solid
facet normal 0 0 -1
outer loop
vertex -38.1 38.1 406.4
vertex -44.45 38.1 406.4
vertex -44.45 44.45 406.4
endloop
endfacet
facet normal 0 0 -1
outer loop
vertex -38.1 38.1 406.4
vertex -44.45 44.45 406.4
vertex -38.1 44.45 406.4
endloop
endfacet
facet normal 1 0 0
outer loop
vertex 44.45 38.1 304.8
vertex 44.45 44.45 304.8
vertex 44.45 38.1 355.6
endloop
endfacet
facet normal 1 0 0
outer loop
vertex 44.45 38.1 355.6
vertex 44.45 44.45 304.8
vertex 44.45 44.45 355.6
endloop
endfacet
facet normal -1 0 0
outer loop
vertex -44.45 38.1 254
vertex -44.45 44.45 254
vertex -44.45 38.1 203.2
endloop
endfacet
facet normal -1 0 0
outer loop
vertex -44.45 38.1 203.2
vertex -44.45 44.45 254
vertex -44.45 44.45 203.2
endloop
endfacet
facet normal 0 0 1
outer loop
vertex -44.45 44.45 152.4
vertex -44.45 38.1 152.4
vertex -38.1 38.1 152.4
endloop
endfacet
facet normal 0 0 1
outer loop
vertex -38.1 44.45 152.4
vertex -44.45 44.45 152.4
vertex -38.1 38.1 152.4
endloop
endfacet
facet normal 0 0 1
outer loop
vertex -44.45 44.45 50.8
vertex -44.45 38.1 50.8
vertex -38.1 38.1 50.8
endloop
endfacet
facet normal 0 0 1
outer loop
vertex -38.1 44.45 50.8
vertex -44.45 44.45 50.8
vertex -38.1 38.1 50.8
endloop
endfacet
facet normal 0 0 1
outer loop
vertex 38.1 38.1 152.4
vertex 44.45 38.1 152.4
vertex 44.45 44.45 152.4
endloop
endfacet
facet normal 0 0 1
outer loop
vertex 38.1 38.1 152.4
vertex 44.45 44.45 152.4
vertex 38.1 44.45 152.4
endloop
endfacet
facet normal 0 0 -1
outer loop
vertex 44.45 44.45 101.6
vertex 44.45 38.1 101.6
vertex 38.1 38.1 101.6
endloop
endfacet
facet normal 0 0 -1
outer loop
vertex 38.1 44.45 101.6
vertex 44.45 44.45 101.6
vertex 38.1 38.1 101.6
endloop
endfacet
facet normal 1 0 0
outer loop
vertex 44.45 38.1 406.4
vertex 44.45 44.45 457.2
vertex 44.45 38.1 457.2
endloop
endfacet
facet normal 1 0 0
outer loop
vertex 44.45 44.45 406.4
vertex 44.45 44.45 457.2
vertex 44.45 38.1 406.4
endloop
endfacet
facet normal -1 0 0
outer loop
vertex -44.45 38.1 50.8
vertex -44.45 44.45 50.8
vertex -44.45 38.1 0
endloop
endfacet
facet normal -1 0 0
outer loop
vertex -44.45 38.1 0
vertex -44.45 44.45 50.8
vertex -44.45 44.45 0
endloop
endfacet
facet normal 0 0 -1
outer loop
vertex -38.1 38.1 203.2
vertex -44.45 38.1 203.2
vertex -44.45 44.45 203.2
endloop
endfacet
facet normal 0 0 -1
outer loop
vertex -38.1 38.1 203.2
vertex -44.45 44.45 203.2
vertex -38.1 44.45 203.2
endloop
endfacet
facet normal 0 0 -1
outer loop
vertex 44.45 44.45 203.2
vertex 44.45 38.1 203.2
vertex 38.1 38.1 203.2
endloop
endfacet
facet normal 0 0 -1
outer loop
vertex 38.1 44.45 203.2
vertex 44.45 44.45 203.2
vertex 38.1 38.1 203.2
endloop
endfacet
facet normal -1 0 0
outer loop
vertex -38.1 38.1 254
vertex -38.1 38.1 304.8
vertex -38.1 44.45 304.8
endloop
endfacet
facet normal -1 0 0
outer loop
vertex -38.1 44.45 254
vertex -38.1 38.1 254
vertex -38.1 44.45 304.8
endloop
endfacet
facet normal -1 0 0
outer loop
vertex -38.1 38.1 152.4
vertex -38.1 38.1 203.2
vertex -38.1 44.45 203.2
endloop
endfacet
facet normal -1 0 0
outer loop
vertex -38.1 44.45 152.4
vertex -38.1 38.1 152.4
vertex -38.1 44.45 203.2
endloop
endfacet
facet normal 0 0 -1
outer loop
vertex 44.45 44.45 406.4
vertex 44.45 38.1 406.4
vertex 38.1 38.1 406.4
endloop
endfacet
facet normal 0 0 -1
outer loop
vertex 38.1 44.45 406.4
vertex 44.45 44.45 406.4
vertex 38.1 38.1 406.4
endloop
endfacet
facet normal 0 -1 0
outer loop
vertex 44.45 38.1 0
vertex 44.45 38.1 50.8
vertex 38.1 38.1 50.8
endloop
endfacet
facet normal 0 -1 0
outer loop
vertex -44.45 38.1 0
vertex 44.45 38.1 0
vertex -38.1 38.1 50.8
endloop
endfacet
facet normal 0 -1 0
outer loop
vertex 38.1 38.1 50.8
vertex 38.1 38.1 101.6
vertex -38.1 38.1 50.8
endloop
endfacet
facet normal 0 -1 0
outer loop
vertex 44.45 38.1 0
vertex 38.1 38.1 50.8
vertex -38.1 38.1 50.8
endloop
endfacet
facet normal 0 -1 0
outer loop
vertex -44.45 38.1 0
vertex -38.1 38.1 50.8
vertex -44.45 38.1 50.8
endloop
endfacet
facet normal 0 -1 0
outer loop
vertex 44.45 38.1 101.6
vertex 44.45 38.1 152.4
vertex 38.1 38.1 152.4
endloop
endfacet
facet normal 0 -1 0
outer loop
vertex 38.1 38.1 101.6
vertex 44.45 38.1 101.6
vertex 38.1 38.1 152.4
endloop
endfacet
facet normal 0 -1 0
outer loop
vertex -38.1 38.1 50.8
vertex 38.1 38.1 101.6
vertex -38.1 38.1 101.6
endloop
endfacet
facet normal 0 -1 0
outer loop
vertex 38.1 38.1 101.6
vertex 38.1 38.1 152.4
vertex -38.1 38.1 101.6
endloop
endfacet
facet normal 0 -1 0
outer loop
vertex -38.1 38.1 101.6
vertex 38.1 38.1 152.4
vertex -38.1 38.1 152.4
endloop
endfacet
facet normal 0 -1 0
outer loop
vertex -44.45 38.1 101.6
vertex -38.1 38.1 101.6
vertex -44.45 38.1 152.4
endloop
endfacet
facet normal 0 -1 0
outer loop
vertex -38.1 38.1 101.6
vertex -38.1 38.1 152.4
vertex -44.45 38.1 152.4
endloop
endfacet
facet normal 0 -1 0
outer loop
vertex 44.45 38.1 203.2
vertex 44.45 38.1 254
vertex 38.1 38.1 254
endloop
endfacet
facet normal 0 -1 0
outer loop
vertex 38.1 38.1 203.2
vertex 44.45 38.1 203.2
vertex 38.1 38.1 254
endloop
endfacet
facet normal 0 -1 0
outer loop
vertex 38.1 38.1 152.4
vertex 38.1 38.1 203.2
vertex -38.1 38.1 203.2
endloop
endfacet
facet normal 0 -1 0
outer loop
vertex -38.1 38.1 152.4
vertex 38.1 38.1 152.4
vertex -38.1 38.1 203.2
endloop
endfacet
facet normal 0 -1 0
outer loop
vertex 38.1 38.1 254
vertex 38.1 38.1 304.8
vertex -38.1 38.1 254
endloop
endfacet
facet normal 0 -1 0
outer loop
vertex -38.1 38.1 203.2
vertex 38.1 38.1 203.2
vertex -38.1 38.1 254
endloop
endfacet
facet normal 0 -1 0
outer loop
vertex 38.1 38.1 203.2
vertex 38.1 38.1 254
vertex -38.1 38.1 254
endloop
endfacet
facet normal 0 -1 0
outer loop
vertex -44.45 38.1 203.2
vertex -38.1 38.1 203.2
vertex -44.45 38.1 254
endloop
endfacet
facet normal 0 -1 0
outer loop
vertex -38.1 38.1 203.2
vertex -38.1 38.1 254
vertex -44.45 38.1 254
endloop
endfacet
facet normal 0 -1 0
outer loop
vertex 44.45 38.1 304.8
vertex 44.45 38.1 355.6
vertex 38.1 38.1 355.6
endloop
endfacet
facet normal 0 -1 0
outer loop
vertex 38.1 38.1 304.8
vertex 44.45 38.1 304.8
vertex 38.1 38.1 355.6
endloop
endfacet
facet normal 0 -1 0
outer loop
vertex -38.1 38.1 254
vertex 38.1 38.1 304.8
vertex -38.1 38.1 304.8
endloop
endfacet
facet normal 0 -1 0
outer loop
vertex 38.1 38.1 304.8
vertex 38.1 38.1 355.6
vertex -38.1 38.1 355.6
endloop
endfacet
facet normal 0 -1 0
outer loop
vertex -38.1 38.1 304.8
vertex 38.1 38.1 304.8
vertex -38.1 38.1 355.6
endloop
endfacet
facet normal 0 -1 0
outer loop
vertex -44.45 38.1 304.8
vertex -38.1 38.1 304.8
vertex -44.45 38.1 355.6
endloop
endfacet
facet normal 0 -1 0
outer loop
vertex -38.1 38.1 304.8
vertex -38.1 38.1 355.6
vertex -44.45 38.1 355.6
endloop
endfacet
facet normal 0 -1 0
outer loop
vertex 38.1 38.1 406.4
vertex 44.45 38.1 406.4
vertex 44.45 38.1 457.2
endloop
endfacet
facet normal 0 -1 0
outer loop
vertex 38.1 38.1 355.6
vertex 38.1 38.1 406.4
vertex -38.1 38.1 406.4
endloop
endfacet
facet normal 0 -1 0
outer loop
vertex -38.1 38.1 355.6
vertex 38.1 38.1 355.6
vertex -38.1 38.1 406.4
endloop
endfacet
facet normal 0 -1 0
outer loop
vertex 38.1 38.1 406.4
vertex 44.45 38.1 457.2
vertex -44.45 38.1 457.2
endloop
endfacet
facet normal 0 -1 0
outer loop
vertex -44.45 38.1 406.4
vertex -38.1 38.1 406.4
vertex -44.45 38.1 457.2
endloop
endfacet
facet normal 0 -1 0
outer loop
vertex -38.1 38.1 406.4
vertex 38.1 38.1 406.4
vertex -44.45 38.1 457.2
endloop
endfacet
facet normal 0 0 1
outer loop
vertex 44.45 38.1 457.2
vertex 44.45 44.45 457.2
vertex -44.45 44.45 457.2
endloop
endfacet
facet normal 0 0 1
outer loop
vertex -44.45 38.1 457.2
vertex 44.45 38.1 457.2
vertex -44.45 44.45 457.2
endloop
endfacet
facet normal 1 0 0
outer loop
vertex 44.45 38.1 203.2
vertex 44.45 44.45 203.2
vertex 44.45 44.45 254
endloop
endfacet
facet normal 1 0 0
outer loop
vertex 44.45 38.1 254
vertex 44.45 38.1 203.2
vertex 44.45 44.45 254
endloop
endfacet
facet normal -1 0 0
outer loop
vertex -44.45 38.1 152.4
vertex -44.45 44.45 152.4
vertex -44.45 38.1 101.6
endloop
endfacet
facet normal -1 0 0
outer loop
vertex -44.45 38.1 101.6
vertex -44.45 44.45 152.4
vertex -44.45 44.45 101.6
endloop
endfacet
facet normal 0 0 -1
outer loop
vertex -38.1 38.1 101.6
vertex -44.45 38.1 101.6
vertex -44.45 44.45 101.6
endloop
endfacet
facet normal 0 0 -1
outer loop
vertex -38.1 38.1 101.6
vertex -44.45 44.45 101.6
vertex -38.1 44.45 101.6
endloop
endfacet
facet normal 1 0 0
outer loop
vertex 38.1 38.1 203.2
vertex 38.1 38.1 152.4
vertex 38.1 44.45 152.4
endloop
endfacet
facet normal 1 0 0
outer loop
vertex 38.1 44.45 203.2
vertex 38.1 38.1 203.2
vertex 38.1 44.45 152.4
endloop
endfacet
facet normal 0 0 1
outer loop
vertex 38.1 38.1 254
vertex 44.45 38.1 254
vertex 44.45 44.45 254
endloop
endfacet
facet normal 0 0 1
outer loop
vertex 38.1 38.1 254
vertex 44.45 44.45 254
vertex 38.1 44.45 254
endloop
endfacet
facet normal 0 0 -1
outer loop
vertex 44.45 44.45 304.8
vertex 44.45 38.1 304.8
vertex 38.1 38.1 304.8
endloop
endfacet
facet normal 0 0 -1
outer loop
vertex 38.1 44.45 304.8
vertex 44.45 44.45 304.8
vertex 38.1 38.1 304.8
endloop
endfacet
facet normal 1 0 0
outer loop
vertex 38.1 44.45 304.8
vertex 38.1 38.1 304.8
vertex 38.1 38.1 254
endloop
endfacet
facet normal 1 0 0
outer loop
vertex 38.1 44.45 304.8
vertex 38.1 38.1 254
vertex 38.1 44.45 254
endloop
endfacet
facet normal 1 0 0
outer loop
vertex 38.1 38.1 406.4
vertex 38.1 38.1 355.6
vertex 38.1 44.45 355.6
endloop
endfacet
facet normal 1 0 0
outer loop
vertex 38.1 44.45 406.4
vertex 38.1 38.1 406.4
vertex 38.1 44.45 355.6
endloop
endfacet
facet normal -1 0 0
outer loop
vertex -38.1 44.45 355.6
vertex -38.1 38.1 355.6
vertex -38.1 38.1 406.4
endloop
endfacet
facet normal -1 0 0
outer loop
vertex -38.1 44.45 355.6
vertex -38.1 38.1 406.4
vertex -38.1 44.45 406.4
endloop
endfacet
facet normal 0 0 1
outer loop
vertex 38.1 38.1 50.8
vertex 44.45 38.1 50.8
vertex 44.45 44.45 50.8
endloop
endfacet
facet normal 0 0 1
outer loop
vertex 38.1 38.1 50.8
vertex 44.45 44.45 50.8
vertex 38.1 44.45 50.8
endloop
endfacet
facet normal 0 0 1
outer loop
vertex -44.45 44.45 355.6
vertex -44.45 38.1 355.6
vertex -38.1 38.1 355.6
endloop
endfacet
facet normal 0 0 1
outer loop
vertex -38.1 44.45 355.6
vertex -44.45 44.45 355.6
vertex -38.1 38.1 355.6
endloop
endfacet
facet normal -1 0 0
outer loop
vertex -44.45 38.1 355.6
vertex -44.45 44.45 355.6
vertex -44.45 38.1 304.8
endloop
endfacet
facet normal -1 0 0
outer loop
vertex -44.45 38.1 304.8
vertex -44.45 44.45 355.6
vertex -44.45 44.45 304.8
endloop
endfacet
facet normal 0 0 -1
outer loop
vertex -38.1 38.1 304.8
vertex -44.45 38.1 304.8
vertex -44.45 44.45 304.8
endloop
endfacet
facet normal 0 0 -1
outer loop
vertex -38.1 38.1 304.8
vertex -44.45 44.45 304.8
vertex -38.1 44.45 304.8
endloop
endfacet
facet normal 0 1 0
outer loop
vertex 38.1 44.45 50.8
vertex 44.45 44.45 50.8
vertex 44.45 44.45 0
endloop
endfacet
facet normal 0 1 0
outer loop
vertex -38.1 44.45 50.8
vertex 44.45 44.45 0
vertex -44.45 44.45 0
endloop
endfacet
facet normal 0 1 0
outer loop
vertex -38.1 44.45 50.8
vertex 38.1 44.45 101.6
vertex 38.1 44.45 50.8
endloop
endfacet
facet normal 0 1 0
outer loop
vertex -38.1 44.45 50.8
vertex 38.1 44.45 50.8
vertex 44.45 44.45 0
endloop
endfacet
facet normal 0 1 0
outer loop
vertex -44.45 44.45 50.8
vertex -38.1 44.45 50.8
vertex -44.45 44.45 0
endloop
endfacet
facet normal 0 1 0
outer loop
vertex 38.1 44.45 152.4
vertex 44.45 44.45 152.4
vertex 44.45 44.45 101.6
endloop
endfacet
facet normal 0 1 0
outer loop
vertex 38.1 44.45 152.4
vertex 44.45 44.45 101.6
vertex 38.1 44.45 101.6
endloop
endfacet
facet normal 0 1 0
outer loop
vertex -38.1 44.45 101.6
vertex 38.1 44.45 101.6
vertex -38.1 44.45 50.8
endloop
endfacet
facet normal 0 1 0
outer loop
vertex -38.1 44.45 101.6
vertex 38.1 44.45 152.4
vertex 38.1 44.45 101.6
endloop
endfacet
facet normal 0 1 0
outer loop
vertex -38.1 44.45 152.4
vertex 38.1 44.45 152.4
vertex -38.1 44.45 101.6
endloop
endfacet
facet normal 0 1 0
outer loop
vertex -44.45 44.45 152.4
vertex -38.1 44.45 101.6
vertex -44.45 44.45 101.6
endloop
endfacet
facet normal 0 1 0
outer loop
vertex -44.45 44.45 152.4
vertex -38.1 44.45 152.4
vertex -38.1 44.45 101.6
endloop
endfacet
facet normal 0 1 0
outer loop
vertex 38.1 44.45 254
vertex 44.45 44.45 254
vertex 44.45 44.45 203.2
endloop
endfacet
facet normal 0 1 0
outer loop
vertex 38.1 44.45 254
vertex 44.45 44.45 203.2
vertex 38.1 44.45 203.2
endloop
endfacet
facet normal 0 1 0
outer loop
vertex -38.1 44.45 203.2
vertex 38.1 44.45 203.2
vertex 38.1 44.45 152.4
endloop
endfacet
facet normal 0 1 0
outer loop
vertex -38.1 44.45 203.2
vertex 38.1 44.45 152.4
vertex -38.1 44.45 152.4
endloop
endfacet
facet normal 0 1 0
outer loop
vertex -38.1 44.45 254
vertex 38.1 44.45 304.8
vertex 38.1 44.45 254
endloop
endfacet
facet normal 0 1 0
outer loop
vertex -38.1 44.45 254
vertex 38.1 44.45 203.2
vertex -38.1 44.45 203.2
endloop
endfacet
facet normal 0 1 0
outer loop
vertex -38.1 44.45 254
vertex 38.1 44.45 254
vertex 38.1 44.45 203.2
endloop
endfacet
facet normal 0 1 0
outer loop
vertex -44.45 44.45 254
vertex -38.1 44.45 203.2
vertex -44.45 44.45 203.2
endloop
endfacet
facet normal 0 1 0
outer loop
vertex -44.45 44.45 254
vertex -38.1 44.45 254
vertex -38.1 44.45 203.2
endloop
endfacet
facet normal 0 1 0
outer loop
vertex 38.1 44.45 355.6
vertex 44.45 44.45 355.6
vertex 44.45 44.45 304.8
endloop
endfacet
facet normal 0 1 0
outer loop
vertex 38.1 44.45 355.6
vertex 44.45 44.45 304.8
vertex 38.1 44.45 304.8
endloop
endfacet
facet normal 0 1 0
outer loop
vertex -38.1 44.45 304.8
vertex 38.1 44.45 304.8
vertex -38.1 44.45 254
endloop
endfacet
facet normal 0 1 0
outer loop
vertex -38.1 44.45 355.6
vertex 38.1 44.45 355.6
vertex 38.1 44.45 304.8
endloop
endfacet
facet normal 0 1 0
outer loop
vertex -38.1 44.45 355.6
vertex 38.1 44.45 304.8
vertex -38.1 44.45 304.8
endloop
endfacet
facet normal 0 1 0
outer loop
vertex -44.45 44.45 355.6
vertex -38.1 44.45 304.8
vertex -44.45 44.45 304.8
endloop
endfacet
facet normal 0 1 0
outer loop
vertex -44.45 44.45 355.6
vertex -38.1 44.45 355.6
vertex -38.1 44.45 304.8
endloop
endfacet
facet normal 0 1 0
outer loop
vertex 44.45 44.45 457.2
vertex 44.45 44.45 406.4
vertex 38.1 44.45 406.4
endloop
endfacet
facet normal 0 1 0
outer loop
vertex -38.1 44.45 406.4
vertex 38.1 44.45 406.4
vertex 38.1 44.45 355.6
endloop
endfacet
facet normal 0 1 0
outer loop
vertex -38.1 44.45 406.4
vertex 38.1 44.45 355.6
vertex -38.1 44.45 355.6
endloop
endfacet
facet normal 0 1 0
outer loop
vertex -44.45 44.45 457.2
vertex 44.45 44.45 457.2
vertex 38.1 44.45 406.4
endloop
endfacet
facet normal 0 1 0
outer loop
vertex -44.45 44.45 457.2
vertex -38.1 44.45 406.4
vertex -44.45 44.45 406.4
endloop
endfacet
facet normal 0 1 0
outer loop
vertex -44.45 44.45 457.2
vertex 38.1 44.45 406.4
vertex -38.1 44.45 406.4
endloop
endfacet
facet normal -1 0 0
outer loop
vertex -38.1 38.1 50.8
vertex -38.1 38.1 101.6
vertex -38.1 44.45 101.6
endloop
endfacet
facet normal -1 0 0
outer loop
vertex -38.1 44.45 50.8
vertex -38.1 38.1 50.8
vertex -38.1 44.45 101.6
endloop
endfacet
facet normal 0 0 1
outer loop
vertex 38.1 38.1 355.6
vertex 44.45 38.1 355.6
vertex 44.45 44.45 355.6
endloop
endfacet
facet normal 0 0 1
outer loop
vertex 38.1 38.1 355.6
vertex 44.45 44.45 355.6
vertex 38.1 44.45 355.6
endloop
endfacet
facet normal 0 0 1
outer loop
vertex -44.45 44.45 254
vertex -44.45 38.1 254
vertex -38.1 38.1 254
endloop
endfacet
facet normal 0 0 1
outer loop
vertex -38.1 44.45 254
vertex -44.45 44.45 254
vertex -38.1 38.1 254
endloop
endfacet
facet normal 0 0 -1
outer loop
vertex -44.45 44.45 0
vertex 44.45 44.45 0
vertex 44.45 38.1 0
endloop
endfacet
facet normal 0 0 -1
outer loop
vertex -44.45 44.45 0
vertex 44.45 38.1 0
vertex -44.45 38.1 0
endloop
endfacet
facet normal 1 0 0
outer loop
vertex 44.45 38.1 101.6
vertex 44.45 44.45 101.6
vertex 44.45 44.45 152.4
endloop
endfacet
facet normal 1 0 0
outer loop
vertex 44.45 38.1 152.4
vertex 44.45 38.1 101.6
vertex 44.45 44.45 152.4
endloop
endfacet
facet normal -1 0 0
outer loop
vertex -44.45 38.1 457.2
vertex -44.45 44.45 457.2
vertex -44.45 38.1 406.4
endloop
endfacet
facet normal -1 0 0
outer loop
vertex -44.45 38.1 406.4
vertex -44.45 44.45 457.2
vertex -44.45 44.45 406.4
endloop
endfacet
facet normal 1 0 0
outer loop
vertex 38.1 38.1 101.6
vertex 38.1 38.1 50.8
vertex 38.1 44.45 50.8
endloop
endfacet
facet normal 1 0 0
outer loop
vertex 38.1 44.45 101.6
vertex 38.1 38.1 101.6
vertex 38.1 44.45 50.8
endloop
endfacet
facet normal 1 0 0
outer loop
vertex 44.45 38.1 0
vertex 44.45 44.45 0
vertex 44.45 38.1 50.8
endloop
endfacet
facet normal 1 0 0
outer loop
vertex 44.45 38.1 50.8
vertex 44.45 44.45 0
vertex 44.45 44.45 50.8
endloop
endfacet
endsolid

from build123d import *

# Parameters (mm, degrees)
SKETCH1_W               = 76.2
SKETCH1_H               = 6.35
BASE_EXTRUSION_DEPTH    = 457.2
SKETCH2_W               = 6.35
SKETCH2_H               = 50.8
TAB_DEPTH               = 6.35
LPATTERN1_COUNT         = 5
LPATTERN1_PITCH         = 101.6
MIRROR2_COPY_1_SKETCH_W = 6.35
MIRROR2_COPY_1_SKETCH_H = 50.8
MIRROR2_COPY_1_DEPTH    = 6.35
MIRROR2_COPY_2_SKETCH_W = 6.35
MIRROR2_COPY_2_SKETCH_H = 50.8
MIRROR2_COPY_2_DEPTH    = 6.35
MIRROR2_COPY_3_SKETCH_W = 6.35
MIRROR2_COPY_3_SKETCH_H = 50.8
MIRROR2_COPY_3_DEPTH    = 6.35
MIRROR2_COPY_4_SKETCH_W = 6.35
MIRROR2_COPY_4_SKETCH_H = 50.8
MIRROR2_COPY_4_DEPTH    = 6.35


with BuildPart() as part:
    # Sketch1 → Base Extrusion (new body)
    with BuildSketch(Plane.XY):
        with Locations((0, 41.275)):
            Rectangle(SKETCH1_W, SKETCH1_H)
    extrude(amount=BASE_EXTRUSION_DEPTH)

    # Sketch2 → Tab (add)
    with BuildSketch(Plane(origin=(0, 44.45, 0), x_dir=(1, 0, 0), z_dir=(0, 1, 0))):
        with Locations((-41.275, -431.8)):
            Rectangle(SKETCH2_W, SKETCH2_H)
    tab = extrude(amount=-TAB_DEPTH)

    # LPattern1: Tab ×5
    with Locations(*[(0, 0, -i * LPATTERN1_PITCH) for i in range(1, LPATTERN1_COUNT)]):
        add(tab)

    # Mirror2: Tab across plane
    add(tab.mirror(Plane(origin=(0, 0, 0), x_dir=(0, 0, 1), z_dir=(1, 0, 0))))

    # Mirror2 copy 1 sketch → Mirror2 copy 1 (add)
    with BuildSketch(Plane(origin=(0, 44.45, -101.6), x_dir=(-1, 0, 0), z_dir=(0, 1, 0))):
        with Locations((-41.275, 431.8)):
            Rectangle(MIRROR2_COPY_1_SKETCH_W, MIRROR2_COPY_1_SKETCH_H)
    extrude(amount=-MIRROR2_COPY_1_DEPTH)

    # Mirror2 copy 2 sketch → Mirror2 copy 2 (add)
    with BuildSketch(Plane(origin=(0, 44.45, -203.2), x_dir=(-1, 0, 0), z_dir=(0, 1, 0))):
        with Locations((-41.275, 431.8)):
            Rectangle(MIRROR2_COPY_2_SKETCH_W, MIRROR2_COPY_2_SKETCH_H)
    extrude(amount=-MIRROR2_COPY_2_DEPTH)

    # Mirror2 copy 3 sketch → Mirror2 copy 3 (add)
    with BuildSketch(Plane(origin=(0, 44.45, -304.8), x_dir=(-1, 0, 0), z_dir=(0, 1, 0))):
        with Locations((-41.275, 431.8)):
            Rectangle(MIRROR2_COPY_3_SKETCH_W, MIRROR2_COPY_3_SKETCH_H)
    extrude(amount=-MIRROR2_COPY_3_DEPTH)

    # Mirror2 copy 4 sketch → Mirror2 copy 4 (add)
    with BuildSketch(Plane(origin=(0, 44.45, -406.4), x_dir=(-1, 0, 0), z_dir=(0, 1, 0))):
        with Locations((-41.275, 431.8)):
            Rectangle(MIRROR2_COPY_4_SKETCH_W, MIRROR2_COPY_4_SKETCH_H)
    extrude(amount=-MIRROR2_COPY_4_DEPTH)


solid = part.part
